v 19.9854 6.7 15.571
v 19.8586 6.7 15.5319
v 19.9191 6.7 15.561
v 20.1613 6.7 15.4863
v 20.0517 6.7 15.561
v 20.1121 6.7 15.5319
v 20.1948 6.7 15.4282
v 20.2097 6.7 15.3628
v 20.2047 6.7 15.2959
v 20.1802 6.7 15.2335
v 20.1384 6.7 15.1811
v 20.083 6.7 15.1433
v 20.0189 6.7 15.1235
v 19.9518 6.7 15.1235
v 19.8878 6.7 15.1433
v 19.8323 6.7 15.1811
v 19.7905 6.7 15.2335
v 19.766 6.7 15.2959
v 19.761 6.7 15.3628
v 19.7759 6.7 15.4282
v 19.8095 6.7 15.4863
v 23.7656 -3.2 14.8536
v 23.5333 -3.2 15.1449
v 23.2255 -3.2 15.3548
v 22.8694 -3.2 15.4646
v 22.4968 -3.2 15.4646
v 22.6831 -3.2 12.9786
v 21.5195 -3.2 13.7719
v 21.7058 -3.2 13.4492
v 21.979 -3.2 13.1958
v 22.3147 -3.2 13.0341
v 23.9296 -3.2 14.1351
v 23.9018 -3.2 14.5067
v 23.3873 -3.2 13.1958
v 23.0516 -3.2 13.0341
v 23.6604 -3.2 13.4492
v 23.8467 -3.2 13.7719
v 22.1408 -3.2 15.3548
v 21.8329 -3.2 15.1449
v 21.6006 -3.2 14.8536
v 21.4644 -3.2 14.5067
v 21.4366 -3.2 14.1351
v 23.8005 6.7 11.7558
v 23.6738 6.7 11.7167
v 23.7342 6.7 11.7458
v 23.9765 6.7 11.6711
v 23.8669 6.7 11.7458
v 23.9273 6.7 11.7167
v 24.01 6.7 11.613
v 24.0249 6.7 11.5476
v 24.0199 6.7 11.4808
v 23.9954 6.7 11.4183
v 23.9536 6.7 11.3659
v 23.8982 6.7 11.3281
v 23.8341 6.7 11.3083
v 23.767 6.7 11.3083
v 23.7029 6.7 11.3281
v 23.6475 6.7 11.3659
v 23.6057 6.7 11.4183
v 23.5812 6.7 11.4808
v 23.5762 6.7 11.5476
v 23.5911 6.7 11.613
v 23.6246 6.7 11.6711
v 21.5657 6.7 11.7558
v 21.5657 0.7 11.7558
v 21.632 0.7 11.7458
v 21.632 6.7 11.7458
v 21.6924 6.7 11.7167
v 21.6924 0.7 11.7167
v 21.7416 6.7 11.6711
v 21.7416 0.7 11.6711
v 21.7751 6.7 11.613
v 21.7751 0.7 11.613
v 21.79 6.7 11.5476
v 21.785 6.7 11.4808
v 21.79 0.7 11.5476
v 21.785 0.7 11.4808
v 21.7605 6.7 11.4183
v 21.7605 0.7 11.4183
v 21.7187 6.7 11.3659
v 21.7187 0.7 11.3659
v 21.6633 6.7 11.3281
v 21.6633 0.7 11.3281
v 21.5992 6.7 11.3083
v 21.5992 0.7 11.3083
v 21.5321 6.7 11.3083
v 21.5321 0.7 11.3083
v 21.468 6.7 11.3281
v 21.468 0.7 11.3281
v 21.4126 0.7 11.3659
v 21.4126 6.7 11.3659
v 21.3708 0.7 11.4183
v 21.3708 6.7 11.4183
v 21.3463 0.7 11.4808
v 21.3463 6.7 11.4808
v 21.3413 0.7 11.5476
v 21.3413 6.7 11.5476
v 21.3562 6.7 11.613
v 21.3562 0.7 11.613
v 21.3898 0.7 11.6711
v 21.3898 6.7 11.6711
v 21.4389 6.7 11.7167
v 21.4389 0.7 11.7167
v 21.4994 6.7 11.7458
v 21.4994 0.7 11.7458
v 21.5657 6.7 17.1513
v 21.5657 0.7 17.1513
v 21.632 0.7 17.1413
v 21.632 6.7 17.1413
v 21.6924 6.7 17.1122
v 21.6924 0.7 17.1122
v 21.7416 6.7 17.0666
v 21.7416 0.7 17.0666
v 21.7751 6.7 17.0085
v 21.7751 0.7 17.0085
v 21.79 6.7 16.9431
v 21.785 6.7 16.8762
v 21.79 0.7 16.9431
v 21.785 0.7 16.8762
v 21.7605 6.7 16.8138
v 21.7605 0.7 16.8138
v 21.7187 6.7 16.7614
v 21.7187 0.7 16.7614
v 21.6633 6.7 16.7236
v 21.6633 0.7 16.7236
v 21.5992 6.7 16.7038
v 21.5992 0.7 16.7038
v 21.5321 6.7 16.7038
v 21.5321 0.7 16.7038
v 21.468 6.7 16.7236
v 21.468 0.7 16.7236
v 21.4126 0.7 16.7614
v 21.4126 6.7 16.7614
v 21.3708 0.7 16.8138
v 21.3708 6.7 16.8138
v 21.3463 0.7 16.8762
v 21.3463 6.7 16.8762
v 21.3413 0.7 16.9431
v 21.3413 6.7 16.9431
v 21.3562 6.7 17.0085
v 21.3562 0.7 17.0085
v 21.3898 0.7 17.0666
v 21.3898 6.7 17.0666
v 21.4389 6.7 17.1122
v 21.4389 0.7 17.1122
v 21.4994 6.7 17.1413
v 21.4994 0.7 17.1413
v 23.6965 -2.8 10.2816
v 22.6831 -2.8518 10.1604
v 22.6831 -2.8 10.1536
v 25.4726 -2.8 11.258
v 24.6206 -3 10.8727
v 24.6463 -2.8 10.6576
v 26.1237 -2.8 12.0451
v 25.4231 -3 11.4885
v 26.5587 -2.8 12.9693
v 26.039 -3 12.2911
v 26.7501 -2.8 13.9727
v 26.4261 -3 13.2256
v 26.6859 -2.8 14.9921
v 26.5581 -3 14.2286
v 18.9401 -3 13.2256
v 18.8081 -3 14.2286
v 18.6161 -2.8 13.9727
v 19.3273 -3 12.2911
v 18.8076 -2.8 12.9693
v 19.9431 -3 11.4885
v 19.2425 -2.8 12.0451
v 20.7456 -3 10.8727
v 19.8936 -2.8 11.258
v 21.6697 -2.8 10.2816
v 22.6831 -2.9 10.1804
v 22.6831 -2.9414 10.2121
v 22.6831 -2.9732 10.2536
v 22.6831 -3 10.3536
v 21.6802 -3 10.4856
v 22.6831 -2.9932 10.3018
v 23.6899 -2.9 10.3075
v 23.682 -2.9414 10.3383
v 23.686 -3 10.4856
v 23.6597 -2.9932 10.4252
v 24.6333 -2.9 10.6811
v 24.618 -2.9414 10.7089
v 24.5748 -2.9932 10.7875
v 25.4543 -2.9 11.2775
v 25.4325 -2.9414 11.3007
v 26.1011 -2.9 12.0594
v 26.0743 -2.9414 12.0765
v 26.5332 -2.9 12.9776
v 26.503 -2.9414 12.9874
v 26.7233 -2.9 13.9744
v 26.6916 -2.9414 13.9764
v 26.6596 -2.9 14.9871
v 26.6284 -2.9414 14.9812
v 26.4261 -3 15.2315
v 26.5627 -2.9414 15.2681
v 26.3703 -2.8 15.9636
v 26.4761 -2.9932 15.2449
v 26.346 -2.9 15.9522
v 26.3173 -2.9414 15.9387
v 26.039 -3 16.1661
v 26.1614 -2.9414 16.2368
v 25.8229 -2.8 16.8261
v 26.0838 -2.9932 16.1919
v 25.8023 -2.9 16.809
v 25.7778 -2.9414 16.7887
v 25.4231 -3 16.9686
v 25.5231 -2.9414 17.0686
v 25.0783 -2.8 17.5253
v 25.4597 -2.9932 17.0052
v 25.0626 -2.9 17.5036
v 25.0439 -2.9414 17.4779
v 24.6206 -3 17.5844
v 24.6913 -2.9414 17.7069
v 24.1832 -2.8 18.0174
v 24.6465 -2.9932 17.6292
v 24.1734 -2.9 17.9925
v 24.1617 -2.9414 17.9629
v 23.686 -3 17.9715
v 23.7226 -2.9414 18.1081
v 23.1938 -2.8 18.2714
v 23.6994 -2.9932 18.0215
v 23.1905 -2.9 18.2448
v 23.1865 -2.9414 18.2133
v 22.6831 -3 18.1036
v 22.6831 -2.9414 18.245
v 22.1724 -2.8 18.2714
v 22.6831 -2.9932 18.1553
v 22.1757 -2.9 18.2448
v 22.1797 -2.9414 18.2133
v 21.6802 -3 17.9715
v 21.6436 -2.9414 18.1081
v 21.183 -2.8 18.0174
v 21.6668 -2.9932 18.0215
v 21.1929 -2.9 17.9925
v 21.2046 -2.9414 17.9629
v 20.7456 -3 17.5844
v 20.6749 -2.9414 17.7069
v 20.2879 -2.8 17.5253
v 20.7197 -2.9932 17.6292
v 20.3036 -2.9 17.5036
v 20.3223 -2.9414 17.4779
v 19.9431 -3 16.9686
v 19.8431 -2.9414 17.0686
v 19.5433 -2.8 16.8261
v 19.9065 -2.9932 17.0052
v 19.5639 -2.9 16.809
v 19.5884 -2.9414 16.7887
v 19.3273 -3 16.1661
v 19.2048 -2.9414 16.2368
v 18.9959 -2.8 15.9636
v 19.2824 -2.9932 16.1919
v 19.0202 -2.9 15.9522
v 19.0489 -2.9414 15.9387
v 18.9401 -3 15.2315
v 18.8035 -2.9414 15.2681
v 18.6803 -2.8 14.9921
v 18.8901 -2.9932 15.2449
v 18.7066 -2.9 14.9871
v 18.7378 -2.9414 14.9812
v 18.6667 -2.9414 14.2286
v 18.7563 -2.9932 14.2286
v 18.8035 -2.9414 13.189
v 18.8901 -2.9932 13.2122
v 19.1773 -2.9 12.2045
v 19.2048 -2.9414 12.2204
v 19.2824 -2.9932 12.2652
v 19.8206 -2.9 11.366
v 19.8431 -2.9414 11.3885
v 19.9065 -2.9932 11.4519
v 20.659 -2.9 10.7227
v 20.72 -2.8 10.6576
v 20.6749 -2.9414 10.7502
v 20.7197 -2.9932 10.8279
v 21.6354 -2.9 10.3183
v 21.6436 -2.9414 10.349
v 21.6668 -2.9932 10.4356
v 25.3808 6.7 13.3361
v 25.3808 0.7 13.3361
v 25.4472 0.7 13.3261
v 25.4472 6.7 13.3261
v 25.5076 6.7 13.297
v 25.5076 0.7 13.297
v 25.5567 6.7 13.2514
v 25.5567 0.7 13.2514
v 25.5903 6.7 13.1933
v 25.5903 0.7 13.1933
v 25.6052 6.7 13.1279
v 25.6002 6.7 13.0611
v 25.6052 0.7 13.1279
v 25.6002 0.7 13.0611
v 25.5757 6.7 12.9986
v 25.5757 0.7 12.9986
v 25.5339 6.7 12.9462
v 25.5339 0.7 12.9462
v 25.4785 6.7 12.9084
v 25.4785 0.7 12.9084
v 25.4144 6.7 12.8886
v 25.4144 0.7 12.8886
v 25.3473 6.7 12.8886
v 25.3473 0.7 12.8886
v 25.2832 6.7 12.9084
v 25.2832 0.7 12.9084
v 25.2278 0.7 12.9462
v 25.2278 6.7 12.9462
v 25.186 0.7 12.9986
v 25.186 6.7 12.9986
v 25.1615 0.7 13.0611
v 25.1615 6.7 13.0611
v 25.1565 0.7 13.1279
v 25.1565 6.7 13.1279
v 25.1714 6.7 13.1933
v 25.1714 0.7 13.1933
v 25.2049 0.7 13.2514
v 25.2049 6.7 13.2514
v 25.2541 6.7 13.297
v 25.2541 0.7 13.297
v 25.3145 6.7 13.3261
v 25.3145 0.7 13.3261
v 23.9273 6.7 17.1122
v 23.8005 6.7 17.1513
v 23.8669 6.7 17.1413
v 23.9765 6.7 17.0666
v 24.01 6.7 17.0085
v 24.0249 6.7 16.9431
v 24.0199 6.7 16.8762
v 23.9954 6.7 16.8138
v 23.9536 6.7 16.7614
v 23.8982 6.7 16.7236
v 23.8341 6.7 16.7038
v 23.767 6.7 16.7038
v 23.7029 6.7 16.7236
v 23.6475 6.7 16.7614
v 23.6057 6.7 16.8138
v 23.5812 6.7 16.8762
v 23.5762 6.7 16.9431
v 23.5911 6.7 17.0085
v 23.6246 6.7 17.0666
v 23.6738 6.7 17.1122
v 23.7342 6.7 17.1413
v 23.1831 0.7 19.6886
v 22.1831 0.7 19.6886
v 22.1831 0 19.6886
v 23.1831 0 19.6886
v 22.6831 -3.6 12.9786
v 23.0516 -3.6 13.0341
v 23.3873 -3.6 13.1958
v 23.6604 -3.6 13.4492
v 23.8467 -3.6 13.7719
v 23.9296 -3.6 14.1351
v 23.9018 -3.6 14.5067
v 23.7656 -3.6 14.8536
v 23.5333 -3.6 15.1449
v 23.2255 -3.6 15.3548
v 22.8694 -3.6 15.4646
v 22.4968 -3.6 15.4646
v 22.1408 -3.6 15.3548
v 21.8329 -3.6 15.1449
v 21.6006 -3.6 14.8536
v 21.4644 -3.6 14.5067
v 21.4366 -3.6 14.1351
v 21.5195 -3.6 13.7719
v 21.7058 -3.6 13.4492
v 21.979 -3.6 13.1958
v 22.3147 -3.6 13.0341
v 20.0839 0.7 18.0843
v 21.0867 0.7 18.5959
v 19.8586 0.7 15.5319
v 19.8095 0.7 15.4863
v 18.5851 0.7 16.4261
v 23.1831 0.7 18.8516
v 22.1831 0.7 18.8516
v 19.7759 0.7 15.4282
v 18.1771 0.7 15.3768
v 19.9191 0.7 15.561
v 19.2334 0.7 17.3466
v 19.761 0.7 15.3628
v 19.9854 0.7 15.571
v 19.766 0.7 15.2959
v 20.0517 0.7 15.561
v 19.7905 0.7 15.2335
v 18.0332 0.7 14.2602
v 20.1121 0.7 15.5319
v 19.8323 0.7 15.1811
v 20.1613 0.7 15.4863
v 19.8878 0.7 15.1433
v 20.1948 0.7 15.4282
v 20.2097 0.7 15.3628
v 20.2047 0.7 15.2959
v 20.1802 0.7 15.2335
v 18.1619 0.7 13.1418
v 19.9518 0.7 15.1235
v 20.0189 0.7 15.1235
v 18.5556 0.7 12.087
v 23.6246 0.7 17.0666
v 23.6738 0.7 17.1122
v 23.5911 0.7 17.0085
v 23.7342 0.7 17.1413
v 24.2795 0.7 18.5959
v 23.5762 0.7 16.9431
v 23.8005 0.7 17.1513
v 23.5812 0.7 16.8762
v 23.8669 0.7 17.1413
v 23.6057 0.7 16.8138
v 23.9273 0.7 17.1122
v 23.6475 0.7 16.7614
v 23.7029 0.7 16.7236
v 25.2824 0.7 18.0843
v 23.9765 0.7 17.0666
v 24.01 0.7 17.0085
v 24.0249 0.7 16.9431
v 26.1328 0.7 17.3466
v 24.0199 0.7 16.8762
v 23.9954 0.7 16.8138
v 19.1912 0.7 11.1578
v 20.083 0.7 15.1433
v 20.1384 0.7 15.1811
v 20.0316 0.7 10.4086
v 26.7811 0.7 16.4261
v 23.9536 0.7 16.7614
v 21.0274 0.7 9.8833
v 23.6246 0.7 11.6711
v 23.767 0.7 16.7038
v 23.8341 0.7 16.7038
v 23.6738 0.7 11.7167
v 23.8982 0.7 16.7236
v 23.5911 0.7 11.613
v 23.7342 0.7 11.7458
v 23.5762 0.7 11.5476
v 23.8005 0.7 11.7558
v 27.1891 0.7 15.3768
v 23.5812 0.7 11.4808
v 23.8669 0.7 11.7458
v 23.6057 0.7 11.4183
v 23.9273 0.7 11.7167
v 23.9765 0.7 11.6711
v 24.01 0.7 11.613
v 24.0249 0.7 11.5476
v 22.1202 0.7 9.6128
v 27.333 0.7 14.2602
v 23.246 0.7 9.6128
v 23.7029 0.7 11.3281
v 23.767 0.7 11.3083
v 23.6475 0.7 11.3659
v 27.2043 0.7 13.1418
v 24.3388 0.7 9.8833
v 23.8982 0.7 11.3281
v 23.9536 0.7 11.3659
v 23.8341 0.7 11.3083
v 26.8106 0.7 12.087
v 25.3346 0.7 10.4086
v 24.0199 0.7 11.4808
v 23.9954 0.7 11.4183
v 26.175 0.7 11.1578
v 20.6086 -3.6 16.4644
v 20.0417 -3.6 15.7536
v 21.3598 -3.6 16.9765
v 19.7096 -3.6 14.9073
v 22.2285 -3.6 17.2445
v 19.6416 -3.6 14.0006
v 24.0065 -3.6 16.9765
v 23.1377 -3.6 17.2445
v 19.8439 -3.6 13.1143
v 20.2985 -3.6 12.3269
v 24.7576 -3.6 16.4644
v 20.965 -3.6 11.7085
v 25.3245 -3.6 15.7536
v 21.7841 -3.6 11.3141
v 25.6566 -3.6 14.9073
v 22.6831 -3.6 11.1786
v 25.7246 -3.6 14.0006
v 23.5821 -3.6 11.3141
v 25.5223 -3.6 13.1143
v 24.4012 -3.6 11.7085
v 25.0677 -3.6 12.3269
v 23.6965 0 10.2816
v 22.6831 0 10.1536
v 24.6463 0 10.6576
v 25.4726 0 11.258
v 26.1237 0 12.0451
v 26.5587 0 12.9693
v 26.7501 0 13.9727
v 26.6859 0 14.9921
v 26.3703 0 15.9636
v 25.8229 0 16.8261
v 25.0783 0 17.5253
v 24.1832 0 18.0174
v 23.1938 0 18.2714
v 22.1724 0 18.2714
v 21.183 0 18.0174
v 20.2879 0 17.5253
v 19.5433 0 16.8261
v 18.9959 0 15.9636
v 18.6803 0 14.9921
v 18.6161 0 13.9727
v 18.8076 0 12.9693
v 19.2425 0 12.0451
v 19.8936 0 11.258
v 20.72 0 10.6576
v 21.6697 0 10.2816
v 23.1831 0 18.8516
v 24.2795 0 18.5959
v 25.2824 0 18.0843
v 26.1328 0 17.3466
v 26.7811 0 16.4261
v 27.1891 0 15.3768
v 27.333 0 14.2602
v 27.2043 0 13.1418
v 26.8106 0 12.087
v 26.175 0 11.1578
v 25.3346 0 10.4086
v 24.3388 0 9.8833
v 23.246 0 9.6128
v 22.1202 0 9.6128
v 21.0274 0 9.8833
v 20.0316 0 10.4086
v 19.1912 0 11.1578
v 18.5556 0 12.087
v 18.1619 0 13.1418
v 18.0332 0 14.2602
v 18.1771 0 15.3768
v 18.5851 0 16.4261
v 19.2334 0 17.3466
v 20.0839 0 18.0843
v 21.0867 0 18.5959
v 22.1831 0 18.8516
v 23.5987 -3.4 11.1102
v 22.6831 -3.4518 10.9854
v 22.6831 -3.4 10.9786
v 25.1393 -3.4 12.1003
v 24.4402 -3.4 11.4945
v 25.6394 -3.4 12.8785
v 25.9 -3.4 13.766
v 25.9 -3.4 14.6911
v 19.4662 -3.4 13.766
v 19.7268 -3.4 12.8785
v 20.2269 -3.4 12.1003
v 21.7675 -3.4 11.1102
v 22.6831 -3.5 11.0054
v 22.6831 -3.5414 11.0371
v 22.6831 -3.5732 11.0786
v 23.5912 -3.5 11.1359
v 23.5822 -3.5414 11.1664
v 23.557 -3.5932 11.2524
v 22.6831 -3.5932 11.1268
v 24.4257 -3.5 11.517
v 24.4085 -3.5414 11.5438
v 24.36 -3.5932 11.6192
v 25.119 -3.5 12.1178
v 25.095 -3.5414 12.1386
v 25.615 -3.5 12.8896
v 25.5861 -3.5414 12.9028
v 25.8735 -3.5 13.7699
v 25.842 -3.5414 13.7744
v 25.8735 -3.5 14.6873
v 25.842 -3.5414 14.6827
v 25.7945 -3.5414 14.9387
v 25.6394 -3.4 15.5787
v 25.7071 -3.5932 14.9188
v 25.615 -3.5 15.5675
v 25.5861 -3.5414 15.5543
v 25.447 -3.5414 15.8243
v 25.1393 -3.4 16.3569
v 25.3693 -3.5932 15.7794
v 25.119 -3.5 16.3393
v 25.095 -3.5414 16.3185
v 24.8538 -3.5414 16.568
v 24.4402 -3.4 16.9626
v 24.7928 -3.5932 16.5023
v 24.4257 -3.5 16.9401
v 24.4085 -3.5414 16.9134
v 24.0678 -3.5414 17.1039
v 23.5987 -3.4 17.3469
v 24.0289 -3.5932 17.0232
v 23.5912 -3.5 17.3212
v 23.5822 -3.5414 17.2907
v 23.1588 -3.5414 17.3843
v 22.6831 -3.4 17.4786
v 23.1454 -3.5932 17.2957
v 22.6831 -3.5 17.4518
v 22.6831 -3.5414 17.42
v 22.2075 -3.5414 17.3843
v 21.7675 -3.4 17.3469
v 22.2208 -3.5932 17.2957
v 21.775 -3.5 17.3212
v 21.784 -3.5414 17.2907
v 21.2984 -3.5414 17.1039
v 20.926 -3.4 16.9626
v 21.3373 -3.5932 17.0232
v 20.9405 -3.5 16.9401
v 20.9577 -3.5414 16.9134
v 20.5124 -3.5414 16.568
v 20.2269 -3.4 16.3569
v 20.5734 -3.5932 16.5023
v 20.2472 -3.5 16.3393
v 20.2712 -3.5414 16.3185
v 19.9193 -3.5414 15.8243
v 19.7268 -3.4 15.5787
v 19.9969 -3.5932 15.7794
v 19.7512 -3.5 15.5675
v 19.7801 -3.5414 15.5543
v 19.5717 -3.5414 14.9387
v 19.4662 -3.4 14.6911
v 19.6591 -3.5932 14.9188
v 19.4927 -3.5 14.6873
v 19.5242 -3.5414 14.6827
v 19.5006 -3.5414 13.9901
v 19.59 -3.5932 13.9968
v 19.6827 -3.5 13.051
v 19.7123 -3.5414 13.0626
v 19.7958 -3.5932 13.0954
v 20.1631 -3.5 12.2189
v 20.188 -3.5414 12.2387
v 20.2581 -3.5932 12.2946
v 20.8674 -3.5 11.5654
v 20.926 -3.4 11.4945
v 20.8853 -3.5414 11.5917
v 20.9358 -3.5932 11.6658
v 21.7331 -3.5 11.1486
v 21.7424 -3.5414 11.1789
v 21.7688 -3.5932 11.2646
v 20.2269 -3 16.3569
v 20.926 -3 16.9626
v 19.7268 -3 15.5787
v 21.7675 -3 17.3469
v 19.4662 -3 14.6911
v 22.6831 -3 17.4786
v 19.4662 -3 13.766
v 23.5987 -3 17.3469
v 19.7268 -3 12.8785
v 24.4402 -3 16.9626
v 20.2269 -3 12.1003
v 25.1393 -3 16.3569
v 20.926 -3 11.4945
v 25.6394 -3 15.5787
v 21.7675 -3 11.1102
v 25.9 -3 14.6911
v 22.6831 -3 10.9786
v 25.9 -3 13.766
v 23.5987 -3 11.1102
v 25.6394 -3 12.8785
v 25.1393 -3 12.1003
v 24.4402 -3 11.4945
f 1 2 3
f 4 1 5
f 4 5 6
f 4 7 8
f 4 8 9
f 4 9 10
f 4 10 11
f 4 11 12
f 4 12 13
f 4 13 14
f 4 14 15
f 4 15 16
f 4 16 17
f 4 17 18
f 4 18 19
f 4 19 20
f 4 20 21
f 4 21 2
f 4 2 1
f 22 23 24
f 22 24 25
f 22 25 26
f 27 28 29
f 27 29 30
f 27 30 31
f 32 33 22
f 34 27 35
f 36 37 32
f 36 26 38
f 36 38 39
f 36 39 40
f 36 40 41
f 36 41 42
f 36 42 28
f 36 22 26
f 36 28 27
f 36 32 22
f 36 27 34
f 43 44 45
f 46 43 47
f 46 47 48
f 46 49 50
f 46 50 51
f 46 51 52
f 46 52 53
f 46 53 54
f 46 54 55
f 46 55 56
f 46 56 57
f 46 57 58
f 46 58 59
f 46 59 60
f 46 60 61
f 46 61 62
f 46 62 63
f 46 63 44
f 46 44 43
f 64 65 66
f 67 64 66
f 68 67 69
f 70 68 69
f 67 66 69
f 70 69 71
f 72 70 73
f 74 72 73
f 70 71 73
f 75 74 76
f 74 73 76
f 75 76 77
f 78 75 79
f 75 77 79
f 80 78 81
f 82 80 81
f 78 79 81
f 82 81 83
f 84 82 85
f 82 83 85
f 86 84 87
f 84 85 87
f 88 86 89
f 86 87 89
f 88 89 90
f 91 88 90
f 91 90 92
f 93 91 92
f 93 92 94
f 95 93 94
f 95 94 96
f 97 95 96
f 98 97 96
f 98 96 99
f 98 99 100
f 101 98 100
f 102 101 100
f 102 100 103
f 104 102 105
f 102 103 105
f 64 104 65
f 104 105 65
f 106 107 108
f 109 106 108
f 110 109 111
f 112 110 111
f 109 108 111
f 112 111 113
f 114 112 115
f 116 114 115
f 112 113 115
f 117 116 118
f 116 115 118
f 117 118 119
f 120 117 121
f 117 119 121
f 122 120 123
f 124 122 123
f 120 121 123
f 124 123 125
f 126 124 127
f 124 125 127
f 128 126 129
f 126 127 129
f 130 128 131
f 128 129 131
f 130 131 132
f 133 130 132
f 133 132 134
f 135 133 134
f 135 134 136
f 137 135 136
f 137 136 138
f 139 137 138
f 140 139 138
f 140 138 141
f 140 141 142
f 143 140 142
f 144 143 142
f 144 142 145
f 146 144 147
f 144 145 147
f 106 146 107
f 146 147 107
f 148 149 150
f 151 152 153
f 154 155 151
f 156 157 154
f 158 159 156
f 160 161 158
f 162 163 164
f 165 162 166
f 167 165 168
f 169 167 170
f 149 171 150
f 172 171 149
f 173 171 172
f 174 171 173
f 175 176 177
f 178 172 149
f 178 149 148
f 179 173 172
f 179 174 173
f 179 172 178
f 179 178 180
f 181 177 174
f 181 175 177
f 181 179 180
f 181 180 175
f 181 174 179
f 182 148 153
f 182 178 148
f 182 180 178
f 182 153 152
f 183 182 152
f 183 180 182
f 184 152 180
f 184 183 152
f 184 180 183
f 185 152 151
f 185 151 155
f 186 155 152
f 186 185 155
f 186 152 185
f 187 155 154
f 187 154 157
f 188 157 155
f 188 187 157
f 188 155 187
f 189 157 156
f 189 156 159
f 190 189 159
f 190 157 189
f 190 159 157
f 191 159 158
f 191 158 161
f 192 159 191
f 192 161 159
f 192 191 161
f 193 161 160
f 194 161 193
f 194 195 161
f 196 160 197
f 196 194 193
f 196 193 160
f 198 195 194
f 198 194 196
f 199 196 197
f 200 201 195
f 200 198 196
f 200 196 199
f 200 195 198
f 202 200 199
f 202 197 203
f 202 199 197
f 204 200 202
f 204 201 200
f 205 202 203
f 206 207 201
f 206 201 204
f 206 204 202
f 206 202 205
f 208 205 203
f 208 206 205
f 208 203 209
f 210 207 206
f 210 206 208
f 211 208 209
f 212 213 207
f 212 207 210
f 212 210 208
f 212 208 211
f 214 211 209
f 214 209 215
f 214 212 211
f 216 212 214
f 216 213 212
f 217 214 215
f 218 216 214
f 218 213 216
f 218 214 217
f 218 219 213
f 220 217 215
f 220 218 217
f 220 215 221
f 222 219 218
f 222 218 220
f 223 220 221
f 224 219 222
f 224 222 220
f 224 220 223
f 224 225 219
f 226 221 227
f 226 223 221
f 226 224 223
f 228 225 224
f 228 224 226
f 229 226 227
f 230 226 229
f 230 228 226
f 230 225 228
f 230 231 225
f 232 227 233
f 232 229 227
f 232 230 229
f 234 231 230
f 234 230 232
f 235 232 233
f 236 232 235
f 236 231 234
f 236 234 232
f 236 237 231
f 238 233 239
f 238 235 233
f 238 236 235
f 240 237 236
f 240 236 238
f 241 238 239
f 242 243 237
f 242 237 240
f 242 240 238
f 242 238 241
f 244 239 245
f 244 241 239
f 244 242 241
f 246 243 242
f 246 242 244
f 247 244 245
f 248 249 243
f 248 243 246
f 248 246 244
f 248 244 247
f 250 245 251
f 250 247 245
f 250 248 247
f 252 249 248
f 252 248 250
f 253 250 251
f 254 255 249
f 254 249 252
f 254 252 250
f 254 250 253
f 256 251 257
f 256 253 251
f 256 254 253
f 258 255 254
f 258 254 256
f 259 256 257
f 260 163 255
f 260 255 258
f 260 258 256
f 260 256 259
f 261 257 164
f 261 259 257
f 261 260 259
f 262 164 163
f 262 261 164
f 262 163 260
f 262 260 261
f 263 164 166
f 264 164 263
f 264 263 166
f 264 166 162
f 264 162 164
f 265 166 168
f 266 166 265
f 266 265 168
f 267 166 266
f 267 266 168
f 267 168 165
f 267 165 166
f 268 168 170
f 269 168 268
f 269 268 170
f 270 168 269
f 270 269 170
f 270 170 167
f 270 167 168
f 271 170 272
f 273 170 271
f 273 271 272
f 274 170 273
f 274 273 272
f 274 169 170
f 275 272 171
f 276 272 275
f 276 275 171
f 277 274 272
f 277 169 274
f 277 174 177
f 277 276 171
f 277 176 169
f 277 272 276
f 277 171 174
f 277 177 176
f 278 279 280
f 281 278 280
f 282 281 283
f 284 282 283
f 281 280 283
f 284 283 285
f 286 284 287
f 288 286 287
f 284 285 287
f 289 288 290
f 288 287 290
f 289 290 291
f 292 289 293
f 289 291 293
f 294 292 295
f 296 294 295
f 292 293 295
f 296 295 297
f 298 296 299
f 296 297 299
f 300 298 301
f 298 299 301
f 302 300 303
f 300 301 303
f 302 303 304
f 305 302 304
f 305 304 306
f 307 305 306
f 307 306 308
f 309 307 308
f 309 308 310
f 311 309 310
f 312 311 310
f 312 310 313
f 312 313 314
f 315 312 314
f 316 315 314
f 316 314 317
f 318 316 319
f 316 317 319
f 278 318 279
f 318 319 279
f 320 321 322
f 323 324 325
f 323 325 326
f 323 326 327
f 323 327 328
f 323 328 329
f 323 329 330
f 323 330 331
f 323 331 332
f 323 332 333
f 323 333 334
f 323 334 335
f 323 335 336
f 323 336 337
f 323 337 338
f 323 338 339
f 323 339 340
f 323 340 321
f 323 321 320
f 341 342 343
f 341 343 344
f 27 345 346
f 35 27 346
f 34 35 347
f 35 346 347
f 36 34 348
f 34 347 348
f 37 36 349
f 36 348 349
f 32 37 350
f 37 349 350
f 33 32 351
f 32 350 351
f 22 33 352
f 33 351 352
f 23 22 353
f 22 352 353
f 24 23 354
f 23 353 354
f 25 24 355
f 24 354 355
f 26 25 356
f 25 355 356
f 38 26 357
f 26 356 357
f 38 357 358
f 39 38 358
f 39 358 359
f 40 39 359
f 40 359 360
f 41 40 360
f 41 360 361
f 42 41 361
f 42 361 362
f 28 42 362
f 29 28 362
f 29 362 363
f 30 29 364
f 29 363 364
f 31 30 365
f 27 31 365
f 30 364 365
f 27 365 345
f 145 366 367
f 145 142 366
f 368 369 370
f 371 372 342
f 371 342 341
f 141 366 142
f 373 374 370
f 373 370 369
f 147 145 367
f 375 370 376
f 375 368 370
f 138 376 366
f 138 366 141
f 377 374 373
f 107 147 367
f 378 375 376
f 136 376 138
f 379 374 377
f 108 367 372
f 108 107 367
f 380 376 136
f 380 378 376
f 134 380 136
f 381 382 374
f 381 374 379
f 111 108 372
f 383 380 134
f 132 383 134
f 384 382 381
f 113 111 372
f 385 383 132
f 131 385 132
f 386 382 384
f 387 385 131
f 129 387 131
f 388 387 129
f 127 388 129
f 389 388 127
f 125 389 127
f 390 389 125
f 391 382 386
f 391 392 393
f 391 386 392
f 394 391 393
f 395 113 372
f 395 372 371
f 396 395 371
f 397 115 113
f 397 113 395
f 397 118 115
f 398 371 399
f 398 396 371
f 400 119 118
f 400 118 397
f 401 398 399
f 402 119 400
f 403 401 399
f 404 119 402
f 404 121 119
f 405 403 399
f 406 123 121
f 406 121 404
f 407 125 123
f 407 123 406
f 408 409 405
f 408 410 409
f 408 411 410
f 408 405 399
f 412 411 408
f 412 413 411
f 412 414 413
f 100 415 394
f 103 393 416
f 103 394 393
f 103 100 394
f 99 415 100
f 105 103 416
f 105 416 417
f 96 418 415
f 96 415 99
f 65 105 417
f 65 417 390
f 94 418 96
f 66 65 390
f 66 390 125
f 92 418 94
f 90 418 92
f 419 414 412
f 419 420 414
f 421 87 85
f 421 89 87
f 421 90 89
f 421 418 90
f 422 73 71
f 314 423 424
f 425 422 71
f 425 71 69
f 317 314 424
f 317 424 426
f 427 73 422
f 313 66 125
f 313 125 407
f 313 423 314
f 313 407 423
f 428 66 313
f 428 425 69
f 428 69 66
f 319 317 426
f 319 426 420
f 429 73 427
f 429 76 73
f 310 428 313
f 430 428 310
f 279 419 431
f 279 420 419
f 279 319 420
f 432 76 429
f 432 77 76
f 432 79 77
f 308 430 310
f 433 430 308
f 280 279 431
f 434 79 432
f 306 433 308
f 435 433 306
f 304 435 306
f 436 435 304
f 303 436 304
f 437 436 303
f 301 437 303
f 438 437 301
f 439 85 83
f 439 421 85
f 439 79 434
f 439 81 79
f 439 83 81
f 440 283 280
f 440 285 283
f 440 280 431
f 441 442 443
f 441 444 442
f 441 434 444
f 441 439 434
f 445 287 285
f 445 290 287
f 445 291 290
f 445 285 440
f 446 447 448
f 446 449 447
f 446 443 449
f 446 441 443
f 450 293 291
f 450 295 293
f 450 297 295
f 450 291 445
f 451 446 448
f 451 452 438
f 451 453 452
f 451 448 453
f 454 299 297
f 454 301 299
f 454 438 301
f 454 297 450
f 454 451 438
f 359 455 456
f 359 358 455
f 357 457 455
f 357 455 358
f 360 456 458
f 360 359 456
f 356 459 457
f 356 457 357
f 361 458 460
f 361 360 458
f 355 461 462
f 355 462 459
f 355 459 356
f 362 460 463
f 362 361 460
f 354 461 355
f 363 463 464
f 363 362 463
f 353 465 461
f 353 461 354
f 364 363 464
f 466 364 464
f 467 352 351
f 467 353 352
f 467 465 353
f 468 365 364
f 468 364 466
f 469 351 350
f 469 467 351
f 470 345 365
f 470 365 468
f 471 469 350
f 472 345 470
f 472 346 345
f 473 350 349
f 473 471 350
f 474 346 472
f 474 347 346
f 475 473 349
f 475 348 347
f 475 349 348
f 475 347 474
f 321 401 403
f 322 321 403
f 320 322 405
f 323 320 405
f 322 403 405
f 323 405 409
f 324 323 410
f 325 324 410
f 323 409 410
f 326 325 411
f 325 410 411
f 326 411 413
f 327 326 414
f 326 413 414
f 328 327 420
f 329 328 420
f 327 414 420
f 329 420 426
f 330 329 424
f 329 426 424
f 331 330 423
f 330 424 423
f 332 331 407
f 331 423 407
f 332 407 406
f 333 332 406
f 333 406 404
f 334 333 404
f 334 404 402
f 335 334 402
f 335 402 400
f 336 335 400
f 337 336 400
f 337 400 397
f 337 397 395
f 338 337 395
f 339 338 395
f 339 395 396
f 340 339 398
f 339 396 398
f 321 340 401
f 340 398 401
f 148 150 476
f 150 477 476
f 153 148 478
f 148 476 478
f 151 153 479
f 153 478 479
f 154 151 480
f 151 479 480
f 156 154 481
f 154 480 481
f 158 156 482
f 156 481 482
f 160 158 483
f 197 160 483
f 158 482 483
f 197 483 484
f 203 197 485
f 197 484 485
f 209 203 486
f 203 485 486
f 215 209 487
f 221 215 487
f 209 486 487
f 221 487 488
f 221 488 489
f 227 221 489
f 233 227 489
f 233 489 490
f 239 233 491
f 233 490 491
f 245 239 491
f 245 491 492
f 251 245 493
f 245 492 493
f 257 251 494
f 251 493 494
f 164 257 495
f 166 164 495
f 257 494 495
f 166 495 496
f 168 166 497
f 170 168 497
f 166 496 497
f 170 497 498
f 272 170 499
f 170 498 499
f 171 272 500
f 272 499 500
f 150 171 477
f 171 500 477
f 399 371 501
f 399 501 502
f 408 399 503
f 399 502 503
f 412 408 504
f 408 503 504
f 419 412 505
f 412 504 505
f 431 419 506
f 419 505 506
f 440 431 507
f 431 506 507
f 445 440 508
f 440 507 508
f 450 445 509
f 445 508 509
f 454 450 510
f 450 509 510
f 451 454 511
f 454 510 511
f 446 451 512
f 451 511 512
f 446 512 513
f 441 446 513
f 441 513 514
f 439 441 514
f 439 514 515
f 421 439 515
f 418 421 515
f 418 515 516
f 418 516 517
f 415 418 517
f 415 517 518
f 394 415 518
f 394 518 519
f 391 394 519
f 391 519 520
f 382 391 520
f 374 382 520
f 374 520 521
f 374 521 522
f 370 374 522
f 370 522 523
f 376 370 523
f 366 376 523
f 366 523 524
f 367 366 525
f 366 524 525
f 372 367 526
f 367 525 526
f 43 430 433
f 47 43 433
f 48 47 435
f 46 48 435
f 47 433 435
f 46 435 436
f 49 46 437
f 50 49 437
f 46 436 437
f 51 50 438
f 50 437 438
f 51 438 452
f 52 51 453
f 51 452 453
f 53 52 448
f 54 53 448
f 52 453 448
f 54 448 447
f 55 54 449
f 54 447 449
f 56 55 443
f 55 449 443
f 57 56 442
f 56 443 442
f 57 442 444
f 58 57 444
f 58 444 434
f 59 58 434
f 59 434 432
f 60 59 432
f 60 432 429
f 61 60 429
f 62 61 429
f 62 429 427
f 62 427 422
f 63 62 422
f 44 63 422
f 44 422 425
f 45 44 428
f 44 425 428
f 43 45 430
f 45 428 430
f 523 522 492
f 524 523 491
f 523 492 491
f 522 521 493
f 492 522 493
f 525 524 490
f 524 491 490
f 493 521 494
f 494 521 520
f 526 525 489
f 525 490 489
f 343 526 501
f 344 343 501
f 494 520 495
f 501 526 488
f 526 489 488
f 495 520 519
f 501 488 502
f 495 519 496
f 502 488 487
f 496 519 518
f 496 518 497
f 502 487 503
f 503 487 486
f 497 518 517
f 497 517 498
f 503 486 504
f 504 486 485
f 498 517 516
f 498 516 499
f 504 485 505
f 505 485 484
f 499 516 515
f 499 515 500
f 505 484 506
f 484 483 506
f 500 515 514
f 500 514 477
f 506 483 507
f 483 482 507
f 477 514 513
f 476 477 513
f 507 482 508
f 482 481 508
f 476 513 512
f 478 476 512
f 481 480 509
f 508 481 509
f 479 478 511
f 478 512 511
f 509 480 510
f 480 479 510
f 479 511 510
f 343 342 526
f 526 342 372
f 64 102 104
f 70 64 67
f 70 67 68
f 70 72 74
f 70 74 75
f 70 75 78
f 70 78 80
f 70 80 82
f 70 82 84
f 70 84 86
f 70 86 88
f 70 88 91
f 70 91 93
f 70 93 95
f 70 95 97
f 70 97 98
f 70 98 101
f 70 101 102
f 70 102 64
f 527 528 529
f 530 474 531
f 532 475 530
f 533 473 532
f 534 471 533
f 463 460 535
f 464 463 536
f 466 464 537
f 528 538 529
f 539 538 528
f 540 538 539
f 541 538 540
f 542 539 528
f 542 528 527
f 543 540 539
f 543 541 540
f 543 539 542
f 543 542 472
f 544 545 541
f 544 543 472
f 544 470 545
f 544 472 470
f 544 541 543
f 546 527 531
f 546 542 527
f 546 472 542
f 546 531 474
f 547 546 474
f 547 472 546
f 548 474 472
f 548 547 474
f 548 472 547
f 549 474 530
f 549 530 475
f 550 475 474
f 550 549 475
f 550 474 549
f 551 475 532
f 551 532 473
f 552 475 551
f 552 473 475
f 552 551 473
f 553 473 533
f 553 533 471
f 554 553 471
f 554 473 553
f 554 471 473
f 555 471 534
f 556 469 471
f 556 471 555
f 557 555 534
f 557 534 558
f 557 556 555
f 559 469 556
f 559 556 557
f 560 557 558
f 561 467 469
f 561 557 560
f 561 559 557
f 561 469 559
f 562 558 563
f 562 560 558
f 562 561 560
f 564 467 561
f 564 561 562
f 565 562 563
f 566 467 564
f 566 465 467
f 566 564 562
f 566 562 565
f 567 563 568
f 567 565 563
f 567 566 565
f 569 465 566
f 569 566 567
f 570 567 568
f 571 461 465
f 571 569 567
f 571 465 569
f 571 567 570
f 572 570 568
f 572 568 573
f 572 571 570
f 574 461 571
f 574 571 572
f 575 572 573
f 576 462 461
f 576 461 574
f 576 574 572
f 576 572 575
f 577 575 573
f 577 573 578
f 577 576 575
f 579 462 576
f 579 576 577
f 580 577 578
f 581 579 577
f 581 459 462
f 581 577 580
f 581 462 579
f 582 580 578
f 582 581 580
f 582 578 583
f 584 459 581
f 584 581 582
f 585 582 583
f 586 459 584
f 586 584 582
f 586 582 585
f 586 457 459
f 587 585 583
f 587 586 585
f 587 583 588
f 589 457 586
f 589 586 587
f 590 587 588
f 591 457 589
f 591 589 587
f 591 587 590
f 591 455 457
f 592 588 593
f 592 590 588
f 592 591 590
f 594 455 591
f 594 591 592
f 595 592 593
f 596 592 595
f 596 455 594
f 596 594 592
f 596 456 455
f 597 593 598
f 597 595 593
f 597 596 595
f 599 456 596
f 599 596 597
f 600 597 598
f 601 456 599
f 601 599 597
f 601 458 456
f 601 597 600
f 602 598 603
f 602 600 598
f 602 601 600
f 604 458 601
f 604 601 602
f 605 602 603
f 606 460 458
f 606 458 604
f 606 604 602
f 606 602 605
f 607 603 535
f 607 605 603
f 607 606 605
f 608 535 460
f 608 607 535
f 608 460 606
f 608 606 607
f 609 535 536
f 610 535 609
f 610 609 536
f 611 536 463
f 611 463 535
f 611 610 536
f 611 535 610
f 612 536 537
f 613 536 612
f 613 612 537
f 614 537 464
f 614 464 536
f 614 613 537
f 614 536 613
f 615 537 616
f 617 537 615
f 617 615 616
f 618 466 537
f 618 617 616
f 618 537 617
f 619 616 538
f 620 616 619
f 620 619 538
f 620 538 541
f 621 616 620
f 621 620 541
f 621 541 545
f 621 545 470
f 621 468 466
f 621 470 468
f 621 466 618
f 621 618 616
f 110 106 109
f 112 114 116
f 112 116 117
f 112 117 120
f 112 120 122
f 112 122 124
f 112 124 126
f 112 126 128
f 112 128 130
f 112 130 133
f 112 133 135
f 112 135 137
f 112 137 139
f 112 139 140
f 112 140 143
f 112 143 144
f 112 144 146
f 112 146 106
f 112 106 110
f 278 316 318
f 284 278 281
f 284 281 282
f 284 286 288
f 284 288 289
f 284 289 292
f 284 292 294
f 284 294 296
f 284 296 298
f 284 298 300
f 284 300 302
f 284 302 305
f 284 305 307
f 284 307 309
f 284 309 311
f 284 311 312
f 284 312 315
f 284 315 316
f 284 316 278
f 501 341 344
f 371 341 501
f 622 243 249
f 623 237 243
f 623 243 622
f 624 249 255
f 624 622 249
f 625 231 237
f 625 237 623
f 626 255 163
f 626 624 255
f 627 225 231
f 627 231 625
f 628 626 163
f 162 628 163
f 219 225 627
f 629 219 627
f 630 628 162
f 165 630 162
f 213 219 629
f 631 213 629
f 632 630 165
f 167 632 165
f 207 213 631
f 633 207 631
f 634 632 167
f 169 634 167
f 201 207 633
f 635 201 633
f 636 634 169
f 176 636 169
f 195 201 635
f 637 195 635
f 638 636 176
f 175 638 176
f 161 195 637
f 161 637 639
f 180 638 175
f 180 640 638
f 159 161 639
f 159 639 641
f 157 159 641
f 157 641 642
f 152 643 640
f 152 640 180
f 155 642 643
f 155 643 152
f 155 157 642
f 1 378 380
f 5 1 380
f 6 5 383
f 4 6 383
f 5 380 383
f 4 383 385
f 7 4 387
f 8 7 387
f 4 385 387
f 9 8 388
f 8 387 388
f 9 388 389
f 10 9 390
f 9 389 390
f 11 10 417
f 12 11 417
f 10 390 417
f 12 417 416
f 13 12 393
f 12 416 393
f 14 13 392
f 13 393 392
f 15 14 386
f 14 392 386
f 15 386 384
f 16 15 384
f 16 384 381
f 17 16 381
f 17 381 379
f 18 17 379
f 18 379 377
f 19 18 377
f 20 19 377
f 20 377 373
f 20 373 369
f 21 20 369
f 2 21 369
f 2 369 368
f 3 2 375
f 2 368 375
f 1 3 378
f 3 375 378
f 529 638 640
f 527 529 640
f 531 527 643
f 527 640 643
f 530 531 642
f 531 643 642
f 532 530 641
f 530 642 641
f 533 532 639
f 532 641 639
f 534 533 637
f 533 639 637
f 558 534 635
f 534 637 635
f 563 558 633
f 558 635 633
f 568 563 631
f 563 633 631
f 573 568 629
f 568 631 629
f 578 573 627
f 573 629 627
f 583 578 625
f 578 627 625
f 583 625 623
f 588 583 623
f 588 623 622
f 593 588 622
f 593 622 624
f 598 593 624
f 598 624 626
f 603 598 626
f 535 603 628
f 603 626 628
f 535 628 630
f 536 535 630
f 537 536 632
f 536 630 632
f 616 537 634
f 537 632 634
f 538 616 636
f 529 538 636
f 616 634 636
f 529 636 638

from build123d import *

# Parameters (mm, degrees)
SKETCH1_R           = 4.65
BOSS_EXTRUDE1_DEPTH = 0.7
SKETCH2_R           = 4.075
BOSS_EXTRUDE2_DEPTH = 3
SKETCH3_R           = 3.25
BOSS_EXTRUDE3_DEPTH = 0.6
FILLET1_R           = 0.2
FILLET2_R           = 0.2
SKETCH4_R           = 1.25
CUT_EXTRUDE1_DEPTH  = 0.4
SKETCH5_W           = 1
SKETCH5_H           = 1.626707286
BOSS_EXTRUDE4_DEPTH = 0.7
SKETCH6_R           = 0.225
BOSS_EXTRUDE5_DEPTH = 6


with BuildPart() as part:
    # Sketch1 → Boss-Extrude1 (new body)
    with BuildSketch(Plane(origin=(0, 0, 0), x_dir=(1, 0, 0), z_dir=(0, 1, 0))):
        with Locations(Location((22.683106859, -14.228561536, 0), (0, 0, 270))):
            Circle(SKETCH1_R)
    extrude(amount=BOSS_EXTRUDE1_DEPTH)

    # Sketch2 → Boss-Extrude2 (add)
    with BuildSketch(Plane.XZ):
        with Locations(Location((22.683106859, 14.228561536, 0), (0, 0, 270))):
            Circle(SKETCH2_R)
    extrude(amount=BOSS_EXTRUDE2_DEPTH)

    # Sketch3 → Boss-Extrude3 (add)
    with BuildSketch(Plane.XZ.offset(3)):
        with Locations(Location((22.683106859, 14.228561536, 0), (0, 0, 270))):
            Circle(SKETCH3_R)
    extrude(amount=BOSS_EXTRUDE3_DEPTH)

    # Fillet1
    fillet1_edges = [part.edges().sort_by_distance(p)[0] for p in [
        (22.683106859, -3, 18.303561536),
    ]]
    fillet(fillet1_edges, radius=FILLET1_R)

    # Fillet2
    fillet2_edges = [part.edges().sort_by_distance(p)[0] for p in [
        (22.683106859, -3.6, 17.478561536),
    ]]
    fillet(fillet2_edges, radius=FILLET2_R)

    # Sketch4 → Cut-Extrude1 (cut)
    with BuildSketch(Plane.XZ.offset(3.6)):
        with Locations(Location((22.683106859, 14.228561536, 0), (0, 0, 270))):
            Circle(SKETCH4_R)
    extrude(amount=-CUT_EXTRUDE1_DEPTH, mode=Mode.SUBTRACT)

    # Sketch5 → Boss-Extrude4 (add)
    with BuildSketch(Plane(origin=(0, 0.7, 0), x_dir=(1, 0, 0), z_dir=(0, 1, 0))):
        with Locations((22.683106859, -18.875207893)):
            Rectangle(SKETCH5_W, SKETCH5_H)
    extrude(amount=-BOSS_EXTRUDE4_DEPTH)

    # Sketch6 → Boss-Extrude5 (add)
    with BuildSketch(Plane(origin=(0, 0.7, 0), x_dir=(1, 0, 0), z_dir=(0, 1, 0))):
        with Locations(Location((19.985378624, -15.345997158, 0), (0, 0, 270))):
            Circle(SKETCH6_R)
        with Locations(Location((21.565671236, -16.926289771, 0), (0, 0, 270))):
            Circle(SKETCH6_R)
        with Locations(Location((23.800542481, -16.926289771, 0), (0, 0, 270))):
            Circle(SKETCH6_R)
        with Locations(Location((25.380835094, -13.111125913, 0), (0, 0, 270))):
            Circle(SKETCH6_R)
        with Locations(Location((23.800542481, -11.530833301, 0), (0, 0, 270))):
            Circle(SKETCH6_R)
        with Locations(Location((21.565671236, -11.530833301, 0), (0, 0, 270))):
            Circle(SKETCH6_R)
    extrude(amount=BOSS_EXTRUDE5_DEPTH)


solid = part.part
